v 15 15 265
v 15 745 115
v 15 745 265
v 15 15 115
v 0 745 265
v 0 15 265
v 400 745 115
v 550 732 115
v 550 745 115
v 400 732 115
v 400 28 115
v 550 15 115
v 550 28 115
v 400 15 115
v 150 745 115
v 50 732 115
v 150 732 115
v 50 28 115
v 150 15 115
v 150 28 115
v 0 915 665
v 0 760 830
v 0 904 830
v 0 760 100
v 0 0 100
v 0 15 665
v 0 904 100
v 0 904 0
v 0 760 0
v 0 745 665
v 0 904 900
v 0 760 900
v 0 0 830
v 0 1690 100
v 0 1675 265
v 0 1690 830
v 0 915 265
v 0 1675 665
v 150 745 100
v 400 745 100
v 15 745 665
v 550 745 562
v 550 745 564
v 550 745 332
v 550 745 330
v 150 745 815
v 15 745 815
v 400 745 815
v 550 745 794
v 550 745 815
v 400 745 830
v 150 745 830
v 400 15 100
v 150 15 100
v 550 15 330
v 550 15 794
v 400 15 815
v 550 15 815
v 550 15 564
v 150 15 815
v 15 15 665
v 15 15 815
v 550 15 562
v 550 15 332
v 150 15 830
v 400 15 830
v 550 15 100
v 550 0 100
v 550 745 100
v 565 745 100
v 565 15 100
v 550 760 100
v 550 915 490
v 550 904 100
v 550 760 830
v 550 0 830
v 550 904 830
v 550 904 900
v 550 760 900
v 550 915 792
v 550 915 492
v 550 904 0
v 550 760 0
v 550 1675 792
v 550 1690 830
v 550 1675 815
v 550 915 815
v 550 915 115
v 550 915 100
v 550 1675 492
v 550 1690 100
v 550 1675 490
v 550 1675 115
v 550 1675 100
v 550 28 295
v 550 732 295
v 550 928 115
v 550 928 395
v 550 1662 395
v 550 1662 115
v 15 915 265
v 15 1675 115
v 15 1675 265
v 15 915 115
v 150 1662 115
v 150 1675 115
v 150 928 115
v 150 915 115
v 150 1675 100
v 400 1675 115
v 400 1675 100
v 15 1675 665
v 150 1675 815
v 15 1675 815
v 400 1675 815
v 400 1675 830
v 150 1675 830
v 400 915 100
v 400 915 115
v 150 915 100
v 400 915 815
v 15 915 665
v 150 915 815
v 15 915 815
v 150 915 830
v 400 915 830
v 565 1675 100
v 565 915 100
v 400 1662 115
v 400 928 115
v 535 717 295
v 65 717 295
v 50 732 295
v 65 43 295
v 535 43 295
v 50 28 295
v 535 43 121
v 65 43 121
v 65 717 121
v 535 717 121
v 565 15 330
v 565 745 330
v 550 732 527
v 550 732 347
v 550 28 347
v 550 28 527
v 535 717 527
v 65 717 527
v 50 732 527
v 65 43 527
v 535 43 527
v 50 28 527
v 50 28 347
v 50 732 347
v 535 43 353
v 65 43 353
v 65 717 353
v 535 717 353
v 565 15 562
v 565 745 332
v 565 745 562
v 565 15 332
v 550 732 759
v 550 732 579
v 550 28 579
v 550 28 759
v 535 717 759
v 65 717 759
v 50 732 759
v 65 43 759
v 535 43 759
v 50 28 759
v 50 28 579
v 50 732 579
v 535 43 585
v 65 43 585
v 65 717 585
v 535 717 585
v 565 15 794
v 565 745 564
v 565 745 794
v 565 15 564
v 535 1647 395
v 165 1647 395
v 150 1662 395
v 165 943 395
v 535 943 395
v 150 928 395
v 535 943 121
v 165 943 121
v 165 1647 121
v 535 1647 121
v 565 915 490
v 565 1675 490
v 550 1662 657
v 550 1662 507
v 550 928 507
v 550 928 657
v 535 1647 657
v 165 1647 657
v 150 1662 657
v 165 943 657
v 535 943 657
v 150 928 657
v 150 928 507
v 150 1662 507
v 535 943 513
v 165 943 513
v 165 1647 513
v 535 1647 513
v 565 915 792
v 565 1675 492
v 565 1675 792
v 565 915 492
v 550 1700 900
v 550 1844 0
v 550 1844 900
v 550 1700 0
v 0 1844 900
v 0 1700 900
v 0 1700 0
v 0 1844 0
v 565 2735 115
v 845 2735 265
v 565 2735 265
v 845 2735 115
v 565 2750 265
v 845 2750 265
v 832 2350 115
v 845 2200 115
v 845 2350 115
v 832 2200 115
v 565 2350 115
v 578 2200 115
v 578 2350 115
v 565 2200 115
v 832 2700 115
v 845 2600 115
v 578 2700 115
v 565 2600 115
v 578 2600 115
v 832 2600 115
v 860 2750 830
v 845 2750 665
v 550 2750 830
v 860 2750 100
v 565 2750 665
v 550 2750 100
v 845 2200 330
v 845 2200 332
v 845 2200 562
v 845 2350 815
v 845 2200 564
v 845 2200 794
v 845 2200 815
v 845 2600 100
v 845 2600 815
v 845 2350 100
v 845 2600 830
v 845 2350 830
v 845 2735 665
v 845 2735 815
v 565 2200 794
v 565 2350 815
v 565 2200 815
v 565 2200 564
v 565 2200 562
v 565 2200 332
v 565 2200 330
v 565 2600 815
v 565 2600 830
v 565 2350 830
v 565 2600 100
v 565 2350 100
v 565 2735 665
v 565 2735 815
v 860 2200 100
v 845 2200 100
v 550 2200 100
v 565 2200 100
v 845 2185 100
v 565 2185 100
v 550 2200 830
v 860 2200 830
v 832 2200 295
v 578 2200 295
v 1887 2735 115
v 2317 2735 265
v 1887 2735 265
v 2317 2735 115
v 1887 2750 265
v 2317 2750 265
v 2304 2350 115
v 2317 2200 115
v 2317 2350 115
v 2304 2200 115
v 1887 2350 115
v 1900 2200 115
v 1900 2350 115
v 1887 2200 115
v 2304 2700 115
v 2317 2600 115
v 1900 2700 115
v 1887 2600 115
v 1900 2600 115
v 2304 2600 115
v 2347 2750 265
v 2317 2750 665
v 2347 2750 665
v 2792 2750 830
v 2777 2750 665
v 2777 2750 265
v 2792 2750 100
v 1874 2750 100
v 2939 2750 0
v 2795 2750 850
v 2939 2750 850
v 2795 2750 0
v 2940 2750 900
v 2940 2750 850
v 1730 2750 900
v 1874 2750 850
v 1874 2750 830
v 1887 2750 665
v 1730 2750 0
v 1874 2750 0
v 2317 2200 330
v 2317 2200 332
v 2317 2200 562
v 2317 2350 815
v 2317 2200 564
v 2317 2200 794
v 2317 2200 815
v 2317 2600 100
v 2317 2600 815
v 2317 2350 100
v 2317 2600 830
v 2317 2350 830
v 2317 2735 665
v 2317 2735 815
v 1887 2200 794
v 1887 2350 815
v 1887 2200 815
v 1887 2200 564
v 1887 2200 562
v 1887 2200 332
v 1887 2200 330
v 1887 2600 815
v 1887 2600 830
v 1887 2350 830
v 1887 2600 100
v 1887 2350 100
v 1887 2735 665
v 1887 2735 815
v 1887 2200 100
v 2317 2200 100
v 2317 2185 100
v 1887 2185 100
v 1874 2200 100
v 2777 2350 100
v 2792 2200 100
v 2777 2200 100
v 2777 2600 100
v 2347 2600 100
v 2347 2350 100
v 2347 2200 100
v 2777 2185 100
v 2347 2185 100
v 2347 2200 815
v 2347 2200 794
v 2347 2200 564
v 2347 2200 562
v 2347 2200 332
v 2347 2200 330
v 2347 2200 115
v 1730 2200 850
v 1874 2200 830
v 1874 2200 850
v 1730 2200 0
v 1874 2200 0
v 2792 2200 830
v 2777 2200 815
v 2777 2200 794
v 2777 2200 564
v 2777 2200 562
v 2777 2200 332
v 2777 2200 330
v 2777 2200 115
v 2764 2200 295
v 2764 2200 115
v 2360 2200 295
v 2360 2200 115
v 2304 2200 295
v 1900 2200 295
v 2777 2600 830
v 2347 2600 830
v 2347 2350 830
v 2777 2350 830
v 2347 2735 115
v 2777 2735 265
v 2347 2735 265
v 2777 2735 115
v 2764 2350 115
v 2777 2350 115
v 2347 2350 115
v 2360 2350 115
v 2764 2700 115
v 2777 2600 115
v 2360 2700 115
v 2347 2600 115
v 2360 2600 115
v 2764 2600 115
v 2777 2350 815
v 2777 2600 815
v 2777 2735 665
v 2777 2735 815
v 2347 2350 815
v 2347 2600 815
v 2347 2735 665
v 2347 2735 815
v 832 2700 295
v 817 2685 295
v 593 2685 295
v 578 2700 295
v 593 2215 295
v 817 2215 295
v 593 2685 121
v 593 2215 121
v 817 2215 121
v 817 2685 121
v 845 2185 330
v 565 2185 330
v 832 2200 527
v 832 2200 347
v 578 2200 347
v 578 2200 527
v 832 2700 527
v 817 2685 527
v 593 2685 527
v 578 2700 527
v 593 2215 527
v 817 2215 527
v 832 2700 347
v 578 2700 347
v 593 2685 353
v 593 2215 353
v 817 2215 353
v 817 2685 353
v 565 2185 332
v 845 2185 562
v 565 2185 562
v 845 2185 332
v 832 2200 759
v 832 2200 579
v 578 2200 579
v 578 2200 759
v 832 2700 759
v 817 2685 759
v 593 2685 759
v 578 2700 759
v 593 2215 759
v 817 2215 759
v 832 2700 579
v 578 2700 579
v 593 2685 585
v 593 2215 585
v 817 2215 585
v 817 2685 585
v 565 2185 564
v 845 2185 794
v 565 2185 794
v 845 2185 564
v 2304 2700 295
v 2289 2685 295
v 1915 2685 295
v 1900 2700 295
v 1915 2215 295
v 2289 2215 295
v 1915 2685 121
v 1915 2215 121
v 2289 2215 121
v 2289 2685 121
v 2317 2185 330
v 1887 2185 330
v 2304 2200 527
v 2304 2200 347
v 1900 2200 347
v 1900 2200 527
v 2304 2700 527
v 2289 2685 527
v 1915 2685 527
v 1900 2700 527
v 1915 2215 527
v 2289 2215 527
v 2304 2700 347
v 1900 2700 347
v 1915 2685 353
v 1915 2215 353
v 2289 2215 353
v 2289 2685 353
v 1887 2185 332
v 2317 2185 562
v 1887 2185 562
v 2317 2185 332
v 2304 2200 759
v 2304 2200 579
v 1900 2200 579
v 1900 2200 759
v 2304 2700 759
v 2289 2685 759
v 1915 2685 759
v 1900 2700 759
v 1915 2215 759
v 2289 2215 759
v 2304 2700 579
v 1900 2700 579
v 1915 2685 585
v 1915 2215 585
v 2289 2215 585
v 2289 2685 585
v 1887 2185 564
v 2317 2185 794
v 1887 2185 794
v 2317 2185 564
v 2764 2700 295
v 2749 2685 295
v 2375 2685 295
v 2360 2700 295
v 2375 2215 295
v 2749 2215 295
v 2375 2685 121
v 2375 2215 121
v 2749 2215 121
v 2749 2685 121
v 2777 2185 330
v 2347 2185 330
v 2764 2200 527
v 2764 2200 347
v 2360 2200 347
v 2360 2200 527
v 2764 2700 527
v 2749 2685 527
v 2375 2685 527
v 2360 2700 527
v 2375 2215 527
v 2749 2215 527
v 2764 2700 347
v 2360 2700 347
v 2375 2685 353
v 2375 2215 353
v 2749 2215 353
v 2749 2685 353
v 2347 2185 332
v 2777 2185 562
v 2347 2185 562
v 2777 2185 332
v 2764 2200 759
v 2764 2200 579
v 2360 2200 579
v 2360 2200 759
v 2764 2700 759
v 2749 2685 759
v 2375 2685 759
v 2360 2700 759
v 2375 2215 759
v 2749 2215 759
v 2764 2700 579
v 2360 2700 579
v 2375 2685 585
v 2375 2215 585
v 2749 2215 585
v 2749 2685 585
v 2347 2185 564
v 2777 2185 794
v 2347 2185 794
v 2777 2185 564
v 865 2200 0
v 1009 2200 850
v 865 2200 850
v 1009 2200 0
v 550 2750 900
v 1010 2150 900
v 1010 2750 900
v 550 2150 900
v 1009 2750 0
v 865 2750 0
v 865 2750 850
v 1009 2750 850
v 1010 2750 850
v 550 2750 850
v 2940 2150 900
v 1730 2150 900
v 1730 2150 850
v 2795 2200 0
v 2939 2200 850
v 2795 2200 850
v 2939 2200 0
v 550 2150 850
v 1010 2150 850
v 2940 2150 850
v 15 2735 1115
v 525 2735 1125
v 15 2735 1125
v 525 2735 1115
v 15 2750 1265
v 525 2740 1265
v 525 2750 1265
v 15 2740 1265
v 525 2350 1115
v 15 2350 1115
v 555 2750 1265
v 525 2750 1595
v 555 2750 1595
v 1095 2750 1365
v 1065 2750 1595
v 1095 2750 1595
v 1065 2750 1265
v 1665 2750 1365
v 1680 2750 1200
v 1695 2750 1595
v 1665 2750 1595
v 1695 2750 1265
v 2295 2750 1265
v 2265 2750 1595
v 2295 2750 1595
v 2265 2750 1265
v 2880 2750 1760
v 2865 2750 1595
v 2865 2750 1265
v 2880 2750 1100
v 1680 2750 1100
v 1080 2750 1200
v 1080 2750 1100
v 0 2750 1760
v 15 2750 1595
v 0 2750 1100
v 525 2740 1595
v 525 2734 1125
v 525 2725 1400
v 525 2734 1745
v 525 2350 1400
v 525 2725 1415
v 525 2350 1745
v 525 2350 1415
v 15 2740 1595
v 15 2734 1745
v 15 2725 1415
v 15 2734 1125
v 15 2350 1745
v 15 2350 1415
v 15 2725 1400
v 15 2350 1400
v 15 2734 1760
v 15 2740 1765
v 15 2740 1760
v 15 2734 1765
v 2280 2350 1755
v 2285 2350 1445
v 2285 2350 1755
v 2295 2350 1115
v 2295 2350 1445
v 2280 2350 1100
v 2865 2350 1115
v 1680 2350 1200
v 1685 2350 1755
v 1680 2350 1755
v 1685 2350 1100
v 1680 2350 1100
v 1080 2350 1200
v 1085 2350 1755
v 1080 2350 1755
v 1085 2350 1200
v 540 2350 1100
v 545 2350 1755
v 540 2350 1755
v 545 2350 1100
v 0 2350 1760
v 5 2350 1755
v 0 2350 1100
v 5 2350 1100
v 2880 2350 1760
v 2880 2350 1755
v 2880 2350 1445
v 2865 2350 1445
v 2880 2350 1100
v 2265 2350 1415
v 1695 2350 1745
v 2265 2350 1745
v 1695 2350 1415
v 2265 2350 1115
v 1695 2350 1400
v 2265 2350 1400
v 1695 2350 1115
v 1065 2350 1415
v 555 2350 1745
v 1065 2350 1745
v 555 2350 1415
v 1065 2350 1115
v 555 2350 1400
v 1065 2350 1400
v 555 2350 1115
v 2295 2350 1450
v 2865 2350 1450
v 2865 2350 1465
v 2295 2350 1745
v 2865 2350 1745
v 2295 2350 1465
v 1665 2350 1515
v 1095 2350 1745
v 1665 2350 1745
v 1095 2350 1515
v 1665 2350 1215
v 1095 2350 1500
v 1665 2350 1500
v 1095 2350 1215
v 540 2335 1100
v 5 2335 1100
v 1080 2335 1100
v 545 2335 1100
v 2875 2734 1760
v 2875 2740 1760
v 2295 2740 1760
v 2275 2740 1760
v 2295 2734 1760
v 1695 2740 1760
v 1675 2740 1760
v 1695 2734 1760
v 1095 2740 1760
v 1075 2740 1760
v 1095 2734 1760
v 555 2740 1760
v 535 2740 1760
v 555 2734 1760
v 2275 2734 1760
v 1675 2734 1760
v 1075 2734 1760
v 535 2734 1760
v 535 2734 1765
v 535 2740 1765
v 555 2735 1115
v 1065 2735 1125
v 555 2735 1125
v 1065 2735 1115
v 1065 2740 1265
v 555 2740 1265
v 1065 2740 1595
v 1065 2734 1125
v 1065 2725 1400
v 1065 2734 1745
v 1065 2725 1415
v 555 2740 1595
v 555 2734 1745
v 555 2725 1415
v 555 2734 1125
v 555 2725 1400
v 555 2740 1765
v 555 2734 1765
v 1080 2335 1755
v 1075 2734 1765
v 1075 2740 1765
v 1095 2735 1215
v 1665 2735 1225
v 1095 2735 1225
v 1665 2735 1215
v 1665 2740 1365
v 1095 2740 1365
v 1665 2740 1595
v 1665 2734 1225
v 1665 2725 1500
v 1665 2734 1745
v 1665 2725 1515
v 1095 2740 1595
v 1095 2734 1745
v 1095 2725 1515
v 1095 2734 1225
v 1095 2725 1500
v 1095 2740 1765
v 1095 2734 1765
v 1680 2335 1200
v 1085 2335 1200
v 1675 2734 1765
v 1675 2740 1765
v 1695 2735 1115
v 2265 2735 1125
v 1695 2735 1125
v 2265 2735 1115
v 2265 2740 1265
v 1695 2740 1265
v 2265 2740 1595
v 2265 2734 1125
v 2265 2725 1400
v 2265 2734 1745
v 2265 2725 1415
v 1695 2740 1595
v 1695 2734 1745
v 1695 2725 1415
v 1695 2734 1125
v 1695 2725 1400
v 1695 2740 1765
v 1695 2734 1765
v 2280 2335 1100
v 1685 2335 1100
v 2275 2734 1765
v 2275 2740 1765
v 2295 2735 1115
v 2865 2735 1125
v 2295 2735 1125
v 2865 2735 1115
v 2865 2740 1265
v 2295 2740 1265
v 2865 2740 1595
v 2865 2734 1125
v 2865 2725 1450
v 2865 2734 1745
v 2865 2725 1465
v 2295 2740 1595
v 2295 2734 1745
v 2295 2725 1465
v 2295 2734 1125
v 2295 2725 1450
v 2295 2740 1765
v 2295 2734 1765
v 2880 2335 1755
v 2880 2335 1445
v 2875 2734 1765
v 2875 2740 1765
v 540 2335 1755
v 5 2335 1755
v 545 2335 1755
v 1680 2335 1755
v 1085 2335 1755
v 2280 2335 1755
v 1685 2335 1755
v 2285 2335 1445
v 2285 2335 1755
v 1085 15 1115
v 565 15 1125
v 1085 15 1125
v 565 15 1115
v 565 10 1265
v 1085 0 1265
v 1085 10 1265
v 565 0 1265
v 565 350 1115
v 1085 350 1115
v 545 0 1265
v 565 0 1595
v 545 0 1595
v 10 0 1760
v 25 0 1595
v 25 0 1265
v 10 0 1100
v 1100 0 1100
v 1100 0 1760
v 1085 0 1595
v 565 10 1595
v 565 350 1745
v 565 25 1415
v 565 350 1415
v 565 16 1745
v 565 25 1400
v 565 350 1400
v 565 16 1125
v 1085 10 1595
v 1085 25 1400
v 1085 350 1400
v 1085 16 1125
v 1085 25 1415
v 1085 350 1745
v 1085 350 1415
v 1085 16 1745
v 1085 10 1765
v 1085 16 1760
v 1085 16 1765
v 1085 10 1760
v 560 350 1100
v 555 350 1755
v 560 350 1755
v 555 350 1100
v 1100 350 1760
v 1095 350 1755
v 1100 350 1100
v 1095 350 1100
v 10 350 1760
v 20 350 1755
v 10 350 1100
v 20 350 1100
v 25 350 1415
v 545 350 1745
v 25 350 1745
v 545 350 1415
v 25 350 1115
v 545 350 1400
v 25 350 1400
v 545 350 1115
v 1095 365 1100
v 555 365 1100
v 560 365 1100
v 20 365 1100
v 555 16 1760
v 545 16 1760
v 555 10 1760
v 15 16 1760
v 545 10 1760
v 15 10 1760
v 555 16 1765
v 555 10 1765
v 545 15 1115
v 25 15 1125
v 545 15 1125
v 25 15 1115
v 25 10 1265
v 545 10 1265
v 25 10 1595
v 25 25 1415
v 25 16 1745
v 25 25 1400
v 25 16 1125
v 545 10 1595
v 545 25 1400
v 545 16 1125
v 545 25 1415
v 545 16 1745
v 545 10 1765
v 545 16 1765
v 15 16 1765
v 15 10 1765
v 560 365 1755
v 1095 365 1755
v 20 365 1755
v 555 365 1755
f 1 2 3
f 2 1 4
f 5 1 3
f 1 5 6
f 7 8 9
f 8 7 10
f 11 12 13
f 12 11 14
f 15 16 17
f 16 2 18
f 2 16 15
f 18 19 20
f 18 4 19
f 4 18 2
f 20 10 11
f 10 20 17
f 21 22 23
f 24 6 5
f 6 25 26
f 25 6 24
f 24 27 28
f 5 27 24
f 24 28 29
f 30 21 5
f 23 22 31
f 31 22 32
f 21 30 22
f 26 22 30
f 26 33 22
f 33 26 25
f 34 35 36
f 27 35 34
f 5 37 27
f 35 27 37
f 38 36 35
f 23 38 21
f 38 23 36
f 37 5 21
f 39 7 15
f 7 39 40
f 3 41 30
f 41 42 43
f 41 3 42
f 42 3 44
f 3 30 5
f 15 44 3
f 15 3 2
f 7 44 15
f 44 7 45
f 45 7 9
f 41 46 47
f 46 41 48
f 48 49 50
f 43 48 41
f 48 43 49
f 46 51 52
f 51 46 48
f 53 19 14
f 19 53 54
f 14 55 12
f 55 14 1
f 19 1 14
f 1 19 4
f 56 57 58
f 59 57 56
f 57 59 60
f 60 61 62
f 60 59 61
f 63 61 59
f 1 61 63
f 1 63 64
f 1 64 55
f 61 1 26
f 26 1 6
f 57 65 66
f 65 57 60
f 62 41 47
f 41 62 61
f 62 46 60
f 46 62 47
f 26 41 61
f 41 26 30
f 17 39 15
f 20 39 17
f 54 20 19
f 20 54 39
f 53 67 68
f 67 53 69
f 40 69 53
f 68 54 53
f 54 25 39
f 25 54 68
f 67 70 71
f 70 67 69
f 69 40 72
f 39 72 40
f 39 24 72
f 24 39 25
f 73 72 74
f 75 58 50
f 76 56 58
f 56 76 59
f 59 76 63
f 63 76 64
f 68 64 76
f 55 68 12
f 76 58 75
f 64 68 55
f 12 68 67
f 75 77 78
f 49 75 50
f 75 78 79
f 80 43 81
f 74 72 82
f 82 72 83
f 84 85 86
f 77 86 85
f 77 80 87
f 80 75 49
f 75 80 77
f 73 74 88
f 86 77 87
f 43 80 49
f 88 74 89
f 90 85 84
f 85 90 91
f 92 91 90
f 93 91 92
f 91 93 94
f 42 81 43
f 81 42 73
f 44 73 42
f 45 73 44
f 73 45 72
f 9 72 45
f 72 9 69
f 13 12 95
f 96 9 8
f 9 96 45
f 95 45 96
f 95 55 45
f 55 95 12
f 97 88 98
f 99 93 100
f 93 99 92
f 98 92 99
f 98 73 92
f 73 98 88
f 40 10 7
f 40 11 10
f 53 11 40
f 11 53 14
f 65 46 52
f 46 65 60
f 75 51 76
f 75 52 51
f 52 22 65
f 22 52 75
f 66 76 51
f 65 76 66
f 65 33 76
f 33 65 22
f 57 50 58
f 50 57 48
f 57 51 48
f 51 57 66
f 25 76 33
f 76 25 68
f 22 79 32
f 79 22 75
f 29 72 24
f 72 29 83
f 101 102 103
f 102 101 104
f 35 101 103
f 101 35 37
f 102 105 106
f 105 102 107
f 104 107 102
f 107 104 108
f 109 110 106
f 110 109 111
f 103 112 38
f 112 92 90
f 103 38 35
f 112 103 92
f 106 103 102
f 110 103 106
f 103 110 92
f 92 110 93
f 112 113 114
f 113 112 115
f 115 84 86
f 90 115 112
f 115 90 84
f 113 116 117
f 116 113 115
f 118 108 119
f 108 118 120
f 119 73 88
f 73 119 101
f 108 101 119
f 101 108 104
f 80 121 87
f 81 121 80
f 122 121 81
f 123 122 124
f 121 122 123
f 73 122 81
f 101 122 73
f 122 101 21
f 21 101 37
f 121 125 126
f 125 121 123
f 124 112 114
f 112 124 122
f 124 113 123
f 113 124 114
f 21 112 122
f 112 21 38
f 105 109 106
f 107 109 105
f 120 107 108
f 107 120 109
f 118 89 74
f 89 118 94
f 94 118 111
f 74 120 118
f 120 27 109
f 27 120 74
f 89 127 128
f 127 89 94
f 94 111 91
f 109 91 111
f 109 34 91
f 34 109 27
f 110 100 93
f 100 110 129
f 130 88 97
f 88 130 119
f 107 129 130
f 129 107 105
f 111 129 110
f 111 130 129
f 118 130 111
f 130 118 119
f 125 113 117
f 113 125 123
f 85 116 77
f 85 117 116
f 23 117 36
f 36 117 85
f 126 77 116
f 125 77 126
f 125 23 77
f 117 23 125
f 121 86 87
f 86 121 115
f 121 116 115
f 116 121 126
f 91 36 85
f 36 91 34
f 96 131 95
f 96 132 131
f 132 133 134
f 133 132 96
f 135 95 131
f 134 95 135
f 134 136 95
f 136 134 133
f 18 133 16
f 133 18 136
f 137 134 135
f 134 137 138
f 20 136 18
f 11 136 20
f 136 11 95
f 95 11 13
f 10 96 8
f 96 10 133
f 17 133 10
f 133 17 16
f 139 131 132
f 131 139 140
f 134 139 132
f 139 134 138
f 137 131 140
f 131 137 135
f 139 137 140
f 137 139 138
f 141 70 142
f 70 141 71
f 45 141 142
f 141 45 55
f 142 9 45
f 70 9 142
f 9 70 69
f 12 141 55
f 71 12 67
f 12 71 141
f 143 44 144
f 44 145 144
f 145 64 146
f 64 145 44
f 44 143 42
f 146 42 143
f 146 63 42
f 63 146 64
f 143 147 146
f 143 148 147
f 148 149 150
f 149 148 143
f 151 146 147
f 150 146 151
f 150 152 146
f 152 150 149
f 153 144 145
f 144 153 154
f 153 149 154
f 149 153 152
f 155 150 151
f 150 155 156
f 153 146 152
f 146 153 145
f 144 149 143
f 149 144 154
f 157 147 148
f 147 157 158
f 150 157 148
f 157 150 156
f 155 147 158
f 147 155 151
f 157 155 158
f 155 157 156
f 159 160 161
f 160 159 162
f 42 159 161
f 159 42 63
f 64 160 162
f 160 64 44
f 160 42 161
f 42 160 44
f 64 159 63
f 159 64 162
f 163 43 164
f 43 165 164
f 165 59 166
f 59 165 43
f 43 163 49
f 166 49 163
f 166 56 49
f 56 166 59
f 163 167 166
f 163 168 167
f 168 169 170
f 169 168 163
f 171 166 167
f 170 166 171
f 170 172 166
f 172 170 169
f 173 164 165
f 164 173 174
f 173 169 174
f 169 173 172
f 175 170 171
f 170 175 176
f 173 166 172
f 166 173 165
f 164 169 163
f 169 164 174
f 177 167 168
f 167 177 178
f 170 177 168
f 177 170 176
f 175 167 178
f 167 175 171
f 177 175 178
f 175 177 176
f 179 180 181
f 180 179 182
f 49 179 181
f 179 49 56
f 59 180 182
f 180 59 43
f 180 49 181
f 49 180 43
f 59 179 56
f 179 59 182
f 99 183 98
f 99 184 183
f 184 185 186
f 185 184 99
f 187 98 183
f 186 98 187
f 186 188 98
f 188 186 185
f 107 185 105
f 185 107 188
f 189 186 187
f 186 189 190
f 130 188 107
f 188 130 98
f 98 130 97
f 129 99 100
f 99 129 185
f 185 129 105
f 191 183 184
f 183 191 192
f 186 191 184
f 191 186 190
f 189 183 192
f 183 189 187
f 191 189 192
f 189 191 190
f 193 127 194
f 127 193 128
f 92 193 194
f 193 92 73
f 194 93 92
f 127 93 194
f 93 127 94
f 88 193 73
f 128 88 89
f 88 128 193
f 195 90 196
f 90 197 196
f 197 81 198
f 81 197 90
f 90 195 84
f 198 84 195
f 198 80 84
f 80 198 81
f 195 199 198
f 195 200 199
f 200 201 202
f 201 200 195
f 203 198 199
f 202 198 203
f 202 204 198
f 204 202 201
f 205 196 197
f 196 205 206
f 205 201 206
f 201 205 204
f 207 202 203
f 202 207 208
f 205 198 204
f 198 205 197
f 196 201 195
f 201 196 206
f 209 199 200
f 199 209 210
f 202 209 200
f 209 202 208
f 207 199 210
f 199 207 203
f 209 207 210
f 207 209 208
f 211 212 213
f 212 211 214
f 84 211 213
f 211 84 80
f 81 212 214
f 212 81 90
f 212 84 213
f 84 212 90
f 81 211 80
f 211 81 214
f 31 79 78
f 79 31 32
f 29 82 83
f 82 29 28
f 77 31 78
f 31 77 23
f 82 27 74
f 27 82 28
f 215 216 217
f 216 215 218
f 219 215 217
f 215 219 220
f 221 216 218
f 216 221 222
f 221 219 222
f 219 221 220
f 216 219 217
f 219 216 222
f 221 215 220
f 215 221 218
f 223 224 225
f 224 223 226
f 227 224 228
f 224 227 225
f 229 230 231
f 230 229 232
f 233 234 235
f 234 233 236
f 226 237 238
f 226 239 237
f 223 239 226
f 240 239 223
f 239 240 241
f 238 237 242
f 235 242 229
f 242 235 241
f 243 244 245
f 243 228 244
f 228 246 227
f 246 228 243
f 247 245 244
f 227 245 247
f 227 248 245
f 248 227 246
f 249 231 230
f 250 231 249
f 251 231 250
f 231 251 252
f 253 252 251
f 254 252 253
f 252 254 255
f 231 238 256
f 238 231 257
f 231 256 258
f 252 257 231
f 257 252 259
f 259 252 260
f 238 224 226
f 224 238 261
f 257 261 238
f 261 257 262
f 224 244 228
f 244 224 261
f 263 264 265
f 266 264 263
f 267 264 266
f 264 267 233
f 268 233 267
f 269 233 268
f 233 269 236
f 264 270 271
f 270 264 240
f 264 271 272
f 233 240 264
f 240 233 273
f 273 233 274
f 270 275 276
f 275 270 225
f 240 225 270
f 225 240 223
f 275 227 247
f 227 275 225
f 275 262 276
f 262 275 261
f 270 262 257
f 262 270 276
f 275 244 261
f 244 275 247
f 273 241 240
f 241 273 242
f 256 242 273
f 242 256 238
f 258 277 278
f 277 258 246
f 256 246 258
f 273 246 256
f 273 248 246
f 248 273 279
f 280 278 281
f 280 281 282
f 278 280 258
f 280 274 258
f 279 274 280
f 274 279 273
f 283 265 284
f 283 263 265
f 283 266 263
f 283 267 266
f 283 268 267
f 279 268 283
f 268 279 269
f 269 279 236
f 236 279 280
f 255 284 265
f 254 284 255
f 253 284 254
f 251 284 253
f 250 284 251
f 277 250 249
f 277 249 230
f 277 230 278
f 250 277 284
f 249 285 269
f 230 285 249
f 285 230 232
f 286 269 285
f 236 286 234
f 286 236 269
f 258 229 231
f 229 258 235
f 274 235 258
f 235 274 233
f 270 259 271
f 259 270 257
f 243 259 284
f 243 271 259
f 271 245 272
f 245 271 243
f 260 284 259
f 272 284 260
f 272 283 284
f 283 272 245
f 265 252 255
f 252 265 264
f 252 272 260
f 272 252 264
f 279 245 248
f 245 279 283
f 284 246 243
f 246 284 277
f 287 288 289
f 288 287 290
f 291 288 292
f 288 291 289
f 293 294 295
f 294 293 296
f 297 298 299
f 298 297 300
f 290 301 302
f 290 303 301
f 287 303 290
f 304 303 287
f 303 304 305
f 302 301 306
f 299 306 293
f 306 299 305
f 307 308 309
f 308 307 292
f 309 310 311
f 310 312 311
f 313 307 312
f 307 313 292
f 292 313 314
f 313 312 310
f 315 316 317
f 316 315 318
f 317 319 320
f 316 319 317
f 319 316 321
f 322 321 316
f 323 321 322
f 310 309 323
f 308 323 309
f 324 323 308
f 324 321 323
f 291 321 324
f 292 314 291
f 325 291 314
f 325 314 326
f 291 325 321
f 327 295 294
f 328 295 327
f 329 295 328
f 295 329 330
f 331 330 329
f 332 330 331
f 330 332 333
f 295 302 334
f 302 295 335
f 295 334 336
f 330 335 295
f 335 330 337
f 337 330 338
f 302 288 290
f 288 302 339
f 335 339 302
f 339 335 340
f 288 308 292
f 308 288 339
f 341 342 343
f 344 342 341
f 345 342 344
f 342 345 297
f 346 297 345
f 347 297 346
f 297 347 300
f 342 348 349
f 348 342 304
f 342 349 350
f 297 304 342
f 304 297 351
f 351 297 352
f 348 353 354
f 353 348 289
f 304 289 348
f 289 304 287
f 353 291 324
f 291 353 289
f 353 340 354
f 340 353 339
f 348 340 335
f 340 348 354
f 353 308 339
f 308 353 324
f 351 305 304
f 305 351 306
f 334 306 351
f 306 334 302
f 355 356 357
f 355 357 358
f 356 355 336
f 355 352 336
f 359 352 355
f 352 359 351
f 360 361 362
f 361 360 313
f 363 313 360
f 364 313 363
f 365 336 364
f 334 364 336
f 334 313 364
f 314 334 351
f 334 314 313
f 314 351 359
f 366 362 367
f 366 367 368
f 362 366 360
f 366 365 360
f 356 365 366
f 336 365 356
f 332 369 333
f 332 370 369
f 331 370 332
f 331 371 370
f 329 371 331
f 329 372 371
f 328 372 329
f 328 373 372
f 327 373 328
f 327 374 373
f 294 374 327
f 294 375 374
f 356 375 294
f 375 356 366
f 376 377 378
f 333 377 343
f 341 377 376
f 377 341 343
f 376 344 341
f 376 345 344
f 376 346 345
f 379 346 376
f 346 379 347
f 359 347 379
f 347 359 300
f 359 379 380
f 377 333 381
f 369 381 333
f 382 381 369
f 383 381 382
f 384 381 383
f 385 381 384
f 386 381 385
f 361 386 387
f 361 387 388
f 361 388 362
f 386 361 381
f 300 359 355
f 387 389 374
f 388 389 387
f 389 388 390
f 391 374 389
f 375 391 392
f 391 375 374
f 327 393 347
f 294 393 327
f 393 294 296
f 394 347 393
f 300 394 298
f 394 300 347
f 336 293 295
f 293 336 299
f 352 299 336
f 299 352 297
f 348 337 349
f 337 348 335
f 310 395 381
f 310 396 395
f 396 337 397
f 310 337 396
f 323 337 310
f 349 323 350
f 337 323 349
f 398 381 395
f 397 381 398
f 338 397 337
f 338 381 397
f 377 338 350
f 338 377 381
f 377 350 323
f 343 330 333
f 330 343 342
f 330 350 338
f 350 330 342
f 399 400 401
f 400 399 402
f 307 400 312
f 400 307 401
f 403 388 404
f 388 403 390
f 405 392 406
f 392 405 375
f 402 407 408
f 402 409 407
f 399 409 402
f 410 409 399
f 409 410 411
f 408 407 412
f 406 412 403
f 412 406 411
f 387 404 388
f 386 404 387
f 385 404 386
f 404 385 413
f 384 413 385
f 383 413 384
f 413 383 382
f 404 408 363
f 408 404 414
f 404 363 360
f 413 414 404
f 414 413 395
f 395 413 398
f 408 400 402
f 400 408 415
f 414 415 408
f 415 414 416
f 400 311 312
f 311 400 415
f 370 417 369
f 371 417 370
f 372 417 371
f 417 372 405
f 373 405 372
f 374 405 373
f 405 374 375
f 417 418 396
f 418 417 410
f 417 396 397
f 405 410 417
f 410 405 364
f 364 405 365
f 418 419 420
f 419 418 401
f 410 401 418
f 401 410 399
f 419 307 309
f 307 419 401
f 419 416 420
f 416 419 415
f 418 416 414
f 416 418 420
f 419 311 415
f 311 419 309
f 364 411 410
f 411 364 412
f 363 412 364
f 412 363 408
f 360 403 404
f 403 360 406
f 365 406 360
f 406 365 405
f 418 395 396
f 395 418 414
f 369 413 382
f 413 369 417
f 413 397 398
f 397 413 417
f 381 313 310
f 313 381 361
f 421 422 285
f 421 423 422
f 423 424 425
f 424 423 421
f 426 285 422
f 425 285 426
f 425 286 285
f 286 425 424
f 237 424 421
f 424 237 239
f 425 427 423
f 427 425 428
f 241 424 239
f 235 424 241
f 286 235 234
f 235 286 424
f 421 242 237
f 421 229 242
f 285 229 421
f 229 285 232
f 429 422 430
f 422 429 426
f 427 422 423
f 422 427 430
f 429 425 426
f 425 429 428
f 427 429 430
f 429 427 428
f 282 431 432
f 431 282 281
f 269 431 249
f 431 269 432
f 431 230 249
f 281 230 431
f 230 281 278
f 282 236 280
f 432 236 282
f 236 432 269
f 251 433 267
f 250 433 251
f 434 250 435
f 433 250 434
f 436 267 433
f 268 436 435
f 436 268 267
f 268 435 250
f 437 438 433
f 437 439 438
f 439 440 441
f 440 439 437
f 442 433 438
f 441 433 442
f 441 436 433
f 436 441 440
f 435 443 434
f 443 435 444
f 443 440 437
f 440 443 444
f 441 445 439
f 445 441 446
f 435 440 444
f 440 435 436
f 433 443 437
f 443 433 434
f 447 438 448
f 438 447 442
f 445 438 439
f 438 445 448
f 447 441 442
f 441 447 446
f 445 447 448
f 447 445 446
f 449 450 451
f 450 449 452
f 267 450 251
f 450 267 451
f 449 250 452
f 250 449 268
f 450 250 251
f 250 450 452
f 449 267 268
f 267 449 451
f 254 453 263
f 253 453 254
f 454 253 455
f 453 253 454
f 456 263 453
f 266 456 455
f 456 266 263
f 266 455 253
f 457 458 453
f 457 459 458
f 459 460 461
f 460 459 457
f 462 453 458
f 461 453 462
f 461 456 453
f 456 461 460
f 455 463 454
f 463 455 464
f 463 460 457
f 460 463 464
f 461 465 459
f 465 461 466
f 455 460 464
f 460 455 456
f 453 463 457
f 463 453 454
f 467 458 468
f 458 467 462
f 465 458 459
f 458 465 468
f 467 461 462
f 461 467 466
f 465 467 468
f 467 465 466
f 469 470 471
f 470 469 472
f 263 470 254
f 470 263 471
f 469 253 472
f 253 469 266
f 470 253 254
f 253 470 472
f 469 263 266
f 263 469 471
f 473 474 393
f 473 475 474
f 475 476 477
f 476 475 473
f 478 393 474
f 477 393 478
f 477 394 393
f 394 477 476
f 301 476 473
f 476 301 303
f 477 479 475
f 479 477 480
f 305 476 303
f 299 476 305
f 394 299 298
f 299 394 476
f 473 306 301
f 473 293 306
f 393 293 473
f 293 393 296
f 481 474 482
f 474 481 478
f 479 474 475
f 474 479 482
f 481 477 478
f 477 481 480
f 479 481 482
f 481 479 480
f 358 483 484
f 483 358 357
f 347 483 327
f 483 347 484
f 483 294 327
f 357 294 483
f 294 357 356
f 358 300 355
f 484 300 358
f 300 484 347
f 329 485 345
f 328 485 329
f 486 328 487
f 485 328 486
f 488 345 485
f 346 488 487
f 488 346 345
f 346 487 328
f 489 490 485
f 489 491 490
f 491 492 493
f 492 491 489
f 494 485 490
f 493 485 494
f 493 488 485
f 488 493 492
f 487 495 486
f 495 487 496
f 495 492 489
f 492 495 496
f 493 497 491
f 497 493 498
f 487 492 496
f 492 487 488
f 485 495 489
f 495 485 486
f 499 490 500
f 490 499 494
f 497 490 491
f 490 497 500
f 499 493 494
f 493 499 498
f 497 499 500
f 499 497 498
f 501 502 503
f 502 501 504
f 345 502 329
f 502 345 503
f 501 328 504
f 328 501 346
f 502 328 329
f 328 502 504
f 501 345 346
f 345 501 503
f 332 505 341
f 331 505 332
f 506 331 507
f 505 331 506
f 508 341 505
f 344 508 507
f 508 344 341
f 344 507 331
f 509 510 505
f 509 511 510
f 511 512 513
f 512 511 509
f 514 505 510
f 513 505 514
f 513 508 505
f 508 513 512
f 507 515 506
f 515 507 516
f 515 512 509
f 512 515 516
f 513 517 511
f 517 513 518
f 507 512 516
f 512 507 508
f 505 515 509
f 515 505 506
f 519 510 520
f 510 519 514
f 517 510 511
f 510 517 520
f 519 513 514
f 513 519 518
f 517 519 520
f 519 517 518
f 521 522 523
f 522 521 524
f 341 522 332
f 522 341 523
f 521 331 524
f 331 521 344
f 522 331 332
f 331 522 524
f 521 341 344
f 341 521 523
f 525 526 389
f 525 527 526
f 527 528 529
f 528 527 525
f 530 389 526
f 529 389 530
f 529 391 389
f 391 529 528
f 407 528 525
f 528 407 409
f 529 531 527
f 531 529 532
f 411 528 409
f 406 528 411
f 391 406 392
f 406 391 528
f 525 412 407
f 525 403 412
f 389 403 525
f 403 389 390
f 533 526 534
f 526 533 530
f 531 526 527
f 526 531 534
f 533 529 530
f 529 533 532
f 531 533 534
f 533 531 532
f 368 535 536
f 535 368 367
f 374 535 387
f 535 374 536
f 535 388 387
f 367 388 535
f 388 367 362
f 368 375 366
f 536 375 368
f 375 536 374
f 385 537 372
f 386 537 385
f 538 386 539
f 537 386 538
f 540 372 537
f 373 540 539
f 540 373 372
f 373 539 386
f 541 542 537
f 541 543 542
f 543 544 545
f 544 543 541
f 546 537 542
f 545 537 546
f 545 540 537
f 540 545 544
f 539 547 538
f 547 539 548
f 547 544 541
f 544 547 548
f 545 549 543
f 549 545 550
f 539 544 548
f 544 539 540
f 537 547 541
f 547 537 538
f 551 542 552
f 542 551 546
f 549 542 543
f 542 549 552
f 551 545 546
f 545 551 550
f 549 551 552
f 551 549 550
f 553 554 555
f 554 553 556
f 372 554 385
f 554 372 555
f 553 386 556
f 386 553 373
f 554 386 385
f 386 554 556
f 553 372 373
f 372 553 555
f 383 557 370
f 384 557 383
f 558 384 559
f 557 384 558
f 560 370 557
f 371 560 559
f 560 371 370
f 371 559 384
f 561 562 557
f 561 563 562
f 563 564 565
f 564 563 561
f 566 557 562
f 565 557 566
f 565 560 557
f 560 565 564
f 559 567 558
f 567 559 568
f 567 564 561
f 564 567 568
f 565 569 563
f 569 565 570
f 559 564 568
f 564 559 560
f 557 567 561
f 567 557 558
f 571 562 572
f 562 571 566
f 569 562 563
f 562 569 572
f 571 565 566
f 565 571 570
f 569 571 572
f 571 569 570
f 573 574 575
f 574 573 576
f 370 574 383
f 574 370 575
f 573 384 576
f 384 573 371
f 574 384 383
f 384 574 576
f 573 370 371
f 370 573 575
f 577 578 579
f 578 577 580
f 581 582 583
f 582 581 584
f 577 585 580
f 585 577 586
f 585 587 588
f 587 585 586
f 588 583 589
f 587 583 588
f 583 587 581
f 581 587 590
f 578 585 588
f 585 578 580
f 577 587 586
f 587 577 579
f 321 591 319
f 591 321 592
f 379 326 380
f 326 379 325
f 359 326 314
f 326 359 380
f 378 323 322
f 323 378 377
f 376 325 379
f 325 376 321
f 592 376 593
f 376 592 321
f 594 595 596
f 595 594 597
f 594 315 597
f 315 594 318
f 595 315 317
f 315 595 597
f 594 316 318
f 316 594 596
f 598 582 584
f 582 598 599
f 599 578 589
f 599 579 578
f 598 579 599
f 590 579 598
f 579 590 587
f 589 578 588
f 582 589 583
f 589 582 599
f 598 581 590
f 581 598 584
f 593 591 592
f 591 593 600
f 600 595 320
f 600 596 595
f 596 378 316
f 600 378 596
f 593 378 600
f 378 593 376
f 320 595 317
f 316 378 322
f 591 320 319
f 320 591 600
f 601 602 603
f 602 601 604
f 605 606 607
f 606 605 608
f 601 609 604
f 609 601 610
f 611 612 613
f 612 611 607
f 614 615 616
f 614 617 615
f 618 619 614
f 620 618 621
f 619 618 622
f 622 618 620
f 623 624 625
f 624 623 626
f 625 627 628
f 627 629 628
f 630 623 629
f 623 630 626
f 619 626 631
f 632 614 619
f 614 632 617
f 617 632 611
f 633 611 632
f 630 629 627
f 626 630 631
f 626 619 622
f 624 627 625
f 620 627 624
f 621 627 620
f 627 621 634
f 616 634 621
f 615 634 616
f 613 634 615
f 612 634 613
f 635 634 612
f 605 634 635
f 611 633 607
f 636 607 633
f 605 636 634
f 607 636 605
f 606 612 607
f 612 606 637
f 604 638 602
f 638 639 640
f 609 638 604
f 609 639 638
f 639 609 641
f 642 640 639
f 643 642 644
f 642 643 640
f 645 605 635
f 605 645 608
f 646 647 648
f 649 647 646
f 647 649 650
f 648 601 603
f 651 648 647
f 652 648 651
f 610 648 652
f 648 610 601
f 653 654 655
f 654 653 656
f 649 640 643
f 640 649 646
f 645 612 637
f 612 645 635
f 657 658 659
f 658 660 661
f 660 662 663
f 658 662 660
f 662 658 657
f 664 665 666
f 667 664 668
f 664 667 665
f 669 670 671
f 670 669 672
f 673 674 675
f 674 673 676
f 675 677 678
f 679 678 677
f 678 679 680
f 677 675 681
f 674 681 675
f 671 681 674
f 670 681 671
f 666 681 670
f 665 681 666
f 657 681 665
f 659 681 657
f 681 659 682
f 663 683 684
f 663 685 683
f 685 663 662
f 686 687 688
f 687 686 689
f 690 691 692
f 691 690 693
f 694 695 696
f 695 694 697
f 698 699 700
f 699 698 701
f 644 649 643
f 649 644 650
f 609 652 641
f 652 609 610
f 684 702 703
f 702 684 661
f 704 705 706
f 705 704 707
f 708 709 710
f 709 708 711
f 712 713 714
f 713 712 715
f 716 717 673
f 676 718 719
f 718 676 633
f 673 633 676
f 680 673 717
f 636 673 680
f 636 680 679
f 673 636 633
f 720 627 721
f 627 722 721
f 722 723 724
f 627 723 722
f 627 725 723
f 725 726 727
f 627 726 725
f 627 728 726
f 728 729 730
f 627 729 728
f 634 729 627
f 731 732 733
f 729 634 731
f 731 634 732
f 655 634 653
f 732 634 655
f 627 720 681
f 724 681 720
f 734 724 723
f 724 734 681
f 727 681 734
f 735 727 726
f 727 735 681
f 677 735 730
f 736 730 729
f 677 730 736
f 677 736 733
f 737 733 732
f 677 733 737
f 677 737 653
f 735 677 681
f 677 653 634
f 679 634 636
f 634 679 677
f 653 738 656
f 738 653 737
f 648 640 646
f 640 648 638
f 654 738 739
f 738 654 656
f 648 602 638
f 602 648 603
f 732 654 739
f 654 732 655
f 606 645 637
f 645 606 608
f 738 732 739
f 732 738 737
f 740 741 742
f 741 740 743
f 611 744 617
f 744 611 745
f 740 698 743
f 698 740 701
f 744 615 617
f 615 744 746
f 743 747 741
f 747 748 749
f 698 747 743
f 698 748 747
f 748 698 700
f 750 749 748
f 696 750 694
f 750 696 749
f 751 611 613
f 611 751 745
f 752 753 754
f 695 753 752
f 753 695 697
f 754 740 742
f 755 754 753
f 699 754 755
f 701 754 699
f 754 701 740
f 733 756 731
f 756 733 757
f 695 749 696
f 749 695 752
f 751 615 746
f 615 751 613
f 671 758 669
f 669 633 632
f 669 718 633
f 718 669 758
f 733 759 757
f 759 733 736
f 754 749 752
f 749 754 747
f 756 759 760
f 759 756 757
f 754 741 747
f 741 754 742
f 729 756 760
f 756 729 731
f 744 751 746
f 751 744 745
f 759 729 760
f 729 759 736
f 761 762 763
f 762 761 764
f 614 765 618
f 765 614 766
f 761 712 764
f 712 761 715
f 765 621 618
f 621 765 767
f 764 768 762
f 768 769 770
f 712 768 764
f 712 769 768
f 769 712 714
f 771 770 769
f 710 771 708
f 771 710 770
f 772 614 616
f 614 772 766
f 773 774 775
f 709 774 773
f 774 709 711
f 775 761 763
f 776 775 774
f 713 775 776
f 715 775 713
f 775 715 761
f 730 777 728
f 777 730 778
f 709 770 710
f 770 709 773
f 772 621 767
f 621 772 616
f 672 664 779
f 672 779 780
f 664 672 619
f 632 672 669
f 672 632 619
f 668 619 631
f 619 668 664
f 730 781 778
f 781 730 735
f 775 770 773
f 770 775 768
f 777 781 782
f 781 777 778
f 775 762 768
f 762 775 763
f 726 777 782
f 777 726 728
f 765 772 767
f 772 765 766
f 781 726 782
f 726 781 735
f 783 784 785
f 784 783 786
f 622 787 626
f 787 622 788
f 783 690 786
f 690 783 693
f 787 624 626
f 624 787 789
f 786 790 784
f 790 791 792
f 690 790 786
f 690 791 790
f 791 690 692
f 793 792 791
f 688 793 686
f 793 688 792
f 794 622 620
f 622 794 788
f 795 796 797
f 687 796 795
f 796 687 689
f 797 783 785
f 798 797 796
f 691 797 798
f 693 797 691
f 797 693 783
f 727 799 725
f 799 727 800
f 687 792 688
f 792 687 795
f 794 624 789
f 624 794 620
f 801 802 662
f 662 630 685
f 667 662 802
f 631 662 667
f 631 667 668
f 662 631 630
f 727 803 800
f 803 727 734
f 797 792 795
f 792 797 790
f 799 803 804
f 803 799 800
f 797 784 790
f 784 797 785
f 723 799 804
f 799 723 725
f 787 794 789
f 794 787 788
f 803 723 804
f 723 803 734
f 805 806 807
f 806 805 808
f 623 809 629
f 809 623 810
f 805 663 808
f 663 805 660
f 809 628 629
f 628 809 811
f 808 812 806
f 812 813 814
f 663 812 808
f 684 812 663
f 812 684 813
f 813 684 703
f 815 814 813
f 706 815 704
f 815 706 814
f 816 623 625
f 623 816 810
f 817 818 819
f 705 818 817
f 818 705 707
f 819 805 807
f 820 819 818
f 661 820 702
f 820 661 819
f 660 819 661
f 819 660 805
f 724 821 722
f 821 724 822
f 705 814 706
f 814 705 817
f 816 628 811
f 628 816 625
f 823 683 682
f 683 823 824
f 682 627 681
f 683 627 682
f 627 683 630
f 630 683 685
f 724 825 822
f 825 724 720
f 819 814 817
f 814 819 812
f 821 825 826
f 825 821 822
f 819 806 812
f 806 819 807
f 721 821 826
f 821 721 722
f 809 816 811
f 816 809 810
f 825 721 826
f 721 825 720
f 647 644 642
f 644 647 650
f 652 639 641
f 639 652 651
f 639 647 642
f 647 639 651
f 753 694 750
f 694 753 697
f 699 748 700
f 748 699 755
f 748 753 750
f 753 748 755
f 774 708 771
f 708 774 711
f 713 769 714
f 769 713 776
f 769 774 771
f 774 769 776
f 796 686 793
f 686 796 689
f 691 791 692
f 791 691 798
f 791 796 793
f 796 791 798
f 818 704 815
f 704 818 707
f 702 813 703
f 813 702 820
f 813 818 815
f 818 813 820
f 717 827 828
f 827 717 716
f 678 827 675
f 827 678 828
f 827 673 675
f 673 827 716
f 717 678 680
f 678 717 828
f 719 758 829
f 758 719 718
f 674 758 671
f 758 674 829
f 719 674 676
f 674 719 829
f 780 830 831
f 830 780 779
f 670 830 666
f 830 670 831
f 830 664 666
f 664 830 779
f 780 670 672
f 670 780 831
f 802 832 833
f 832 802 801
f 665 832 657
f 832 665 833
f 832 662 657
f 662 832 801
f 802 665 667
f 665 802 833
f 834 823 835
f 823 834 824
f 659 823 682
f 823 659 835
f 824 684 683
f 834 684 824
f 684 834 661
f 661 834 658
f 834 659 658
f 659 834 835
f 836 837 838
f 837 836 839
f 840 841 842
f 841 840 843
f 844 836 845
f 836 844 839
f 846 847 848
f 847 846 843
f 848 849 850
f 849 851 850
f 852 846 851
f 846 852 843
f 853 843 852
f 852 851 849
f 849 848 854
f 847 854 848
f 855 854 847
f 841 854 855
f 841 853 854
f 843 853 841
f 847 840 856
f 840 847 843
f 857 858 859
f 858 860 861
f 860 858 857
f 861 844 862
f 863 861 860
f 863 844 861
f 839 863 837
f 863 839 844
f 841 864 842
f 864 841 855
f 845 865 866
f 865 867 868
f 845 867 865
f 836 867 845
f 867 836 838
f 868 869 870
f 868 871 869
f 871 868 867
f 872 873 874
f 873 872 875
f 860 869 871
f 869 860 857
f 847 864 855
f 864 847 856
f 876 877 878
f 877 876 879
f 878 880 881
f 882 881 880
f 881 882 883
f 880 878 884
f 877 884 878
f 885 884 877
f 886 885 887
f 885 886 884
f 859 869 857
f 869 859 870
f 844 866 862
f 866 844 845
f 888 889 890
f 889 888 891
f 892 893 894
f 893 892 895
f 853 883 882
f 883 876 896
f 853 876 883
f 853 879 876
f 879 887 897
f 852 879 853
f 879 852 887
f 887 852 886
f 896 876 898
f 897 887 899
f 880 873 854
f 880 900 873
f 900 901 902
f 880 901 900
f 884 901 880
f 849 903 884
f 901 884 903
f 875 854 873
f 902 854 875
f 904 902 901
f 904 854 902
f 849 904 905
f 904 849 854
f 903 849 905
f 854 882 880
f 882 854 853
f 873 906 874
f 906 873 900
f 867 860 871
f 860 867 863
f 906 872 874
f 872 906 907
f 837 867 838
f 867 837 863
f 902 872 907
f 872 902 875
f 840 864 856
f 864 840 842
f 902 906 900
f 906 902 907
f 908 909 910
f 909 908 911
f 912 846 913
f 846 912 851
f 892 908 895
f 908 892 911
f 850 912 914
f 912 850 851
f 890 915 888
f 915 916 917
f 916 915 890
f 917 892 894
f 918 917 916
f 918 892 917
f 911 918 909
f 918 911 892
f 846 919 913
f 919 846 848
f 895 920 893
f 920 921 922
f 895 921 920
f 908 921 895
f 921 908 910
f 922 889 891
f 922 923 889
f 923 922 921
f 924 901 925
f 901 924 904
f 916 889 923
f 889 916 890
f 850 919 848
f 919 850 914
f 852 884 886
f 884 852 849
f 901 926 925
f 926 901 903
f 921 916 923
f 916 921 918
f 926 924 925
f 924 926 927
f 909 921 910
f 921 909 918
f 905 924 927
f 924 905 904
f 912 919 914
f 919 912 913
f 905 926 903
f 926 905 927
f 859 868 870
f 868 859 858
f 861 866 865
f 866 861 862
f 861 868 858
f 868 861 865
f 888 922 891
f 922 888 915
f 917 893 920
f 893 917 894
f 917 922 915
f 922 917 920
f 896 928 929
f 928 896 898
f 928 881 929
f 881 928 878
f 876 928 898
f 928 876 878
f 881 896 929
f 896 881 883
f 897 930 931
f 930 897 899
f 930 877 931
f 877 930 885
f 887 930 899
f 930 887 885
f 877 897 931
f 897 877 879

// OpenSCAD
use <cajoneriaLibV1.scad>

module paredes(){
    translate ([-100,0,0]) color("lightslategray")
    tableroX(ancho=4100,
            alto=2900,
            espesor=100,
            posicion="fondo",
            color="red",
            parte="Pared");
    translate ([0,4100,0]) color("lightslategray")
    tableroX(ancho=1000,
            alto=2900,
            espesor=100,
            posicion="lateral",
            color="red",
            parte="Pared");
//    translate ([1000,4100-180,0]) color("lightslategray")
//    tableroX(ancho=320,
//            alto=2900,
//            espesor=320,
//            posicion="lateral",
//            color="red",
//            parte="Pilar");
    translate ([0,-100,0]) color("white")
    tableroX(ancho=2300,
            alto=2900,
            espesor=100,
            posicion="lateral",
            color="red",
            parte="Pared");
//    translate ([1000,870,0]) color("lightslategray")
//    tableroX(ancho=380,
//            alto=2900,
//            espesor=280,
//            posicion="lateral",
//            color="red",
//            parte="Pilar");
//    translate ([0,3250-400,0]) color("gainsboro")
//    tableroX(ancho=800,
//            alto=1880,
//            espesor=700,
//            posicion="fondo",
//            color="green",
//            parte="Frizer");                
}

//paredes();
module muromeson(){
    tableroX(ancho=550,
            alto=900,
            espesor=144,
            posicion="lateral",
            color="red",
            parte="Pared");
    }
module encimerameson(ancho){
    tableroX(ancho=ancho,
            alto=600,
            espesor=50,
            posicion="techo",
            color="red",
            parte="Pared");
    }

espesor = 15; riel = 13;
socalo = 100;
espacioFrizer = 900;
// modulo(i) = [
//    ancho, alto, profundidad,
//    refuerzo, esqueleto, fondo, espesor,
//    color, [x,y+sum(modulo(i..i-1)[ancho]),z], nombre
//]

mod_00 = [760,730,550,"No","Si","No",espesor,"ghostwhite",
         [0,0,socalo], "Modulo 00"];
mod_01 = [790,730,550,"No","Si","No",espesor,"ghostwhite",
         [0,mod_00[0]+140,socalo], "Modulo 01"];


mod_02 = [310,730,550,"No","Si","No",espesor,"ghostwhite",
         [0,0,socalo], "Modulo 02"];
mod_03 = [460,730,550,"No","Si","No",espesor,"ghostwhite",
         [0,mod_02[0]+312+700,socalo], "Modulo 03"];
mod_04 = [460,730,550,"No","Si","No",espesor,"ghostwhite",
         [0,mod_02[0]+mod_03[0]+312+700,socalo], "Modulo 04"];

/////Modulos Altos
altura_mod = 1100;

mod_05 = [540,660,400,"No","No","Si",espesor,"ghostwhite",
         [0,0,altura_mod], "Modulo 00"];
mod_06 = [540,660,400,"No","No","Si",espesor,"ghostwhite",
         [0,mod_05[0],altura_mod], "Modulo 01"];
mod_07 = [600,560,400,"No","No","Si",espesor,"ghostwhite",
         [0,mod_05[0]+mod_06[0],altura_mod+100], "Modulo 00"];
mod_08 = [600,660,400,"No","No","Si",espesor,"ghostwhite",
         [0,mod_05[0]+mod_06[0]+mod_07[0],altura_mod], "Modulo 01"];

mod_09 = [600,660,400,"No","No","Si",espesor,"ghostwhite",
         [0,mod_05[0]+mod_06[0]+mod_07[0]+mod_08[0],altura_mod], "Modulo 01"];


mod_10 = [550,660,350,"No","No","Si",espesor,"ghostwhite",
         [0,0,altura_mod], "Modulo 00"];
mod_11 = [550,660,350,"No","No","Si",espesor,"ghostwhite",
         [0,mod_05[0],altura_mod], "Modulo 01"];
mod_12 = [600,660,350,"No","No","Si",espesor,"ghostwhite",
         [0,mod_05[0]+mod_06[0],altura_mod], "Modulo 00"];



ModulosLavaPlatos = [mod_00, mod_01];
ModulosCocina = [mod_02, mod_03, mod_04];
ModulosAltos = [mod_05, mod_06, mod_07,
                mod_08, mod_09 
];
ModulosAltos2= [mod_10, mod_11, //mod_12,
];


esp_riel = espesor*2+riel*2;
// cajon_00 = [moduloIndex, ancho, alto, profundidad,
//          espesor, color, frenteDec, anchoDec, altoDec, 
//          colorDec, [x,y,z]]

cajon_00 = [0, mod_00[0]-esp_riel, 180, mod_00[2]-50,
          espesor, "red", "Si", mod_00[0]-espesor*2, 
          230,"green", 
          [mod_00[8][0]+50,
            mod_00[8][1]+espesor+riel,
            mod_00[8][2]+espesor]];
            
cajon_01 = [0, mod_00[0]-esp_riel, 180, mod_00[2]-50,
          espesor, "red", "Si", mod_00[0]-espesor*2, 
          230,"green", 
          [mod_00[8][0]+50,
            mod_00[8][1]+espesor+riel,
            mod_00[8][2]+espesor+230+2]];

cajon_02 = [0, mod_00[0]-esp_riel, 180, mod_00[2]-50,
          espesor, "red", "Si", mod_00[0]-espesor*2, 
          230,"green", 
          [mod_00[8][0]+50,
            mod_00[8][1]+espesor+riel,
            mod_00[8][2]+espesor+230*2+2*2]];

cajon_03 = [1, mod_01[0]-esp_riel, 280, mod_01[2]-150,
          espesor, "red", "Si", mod_01[0]-espesor*2, 
          390,"green", 
          [mod_01[8][0]+150,
            mod_01[8][1]+espesor+riel,
            mod_01[8][2]+espesor]];
            
cajon_04 = [1, mod_01[0]-esp_riel, 150, mod_01[2]-150,
          espesor, "red", "Si", mod_01[0]-espesor*2, 
          300,"green", 
          [mod_01[8][0]+150,
            mod_01[8][1]+espesor+riel,
            mod_01[8][2]+espesor+390+2]];
//////////////////////////////

cajon_05 = [2, mod_02[0]-esp_riel, 180, mod_02[2]-50,
          espesor, "red", "Si", mod_02[0]-espesor*2, 
          230,"green", 
          [mod_02[8][0]+50,
            mod_02[8][1]+espesor+riel,
            mod_02[8][2]+espesor]];
            
cajon_06 = [2, mod_02[0]-esp_riel, 180, mod_02[2]-50,
          espesor, "red", "Si", mod_02[0]-espesor*2, 
          230,"green", 
          [mod_02[8][0]+50,
            mod_02[8][1]+espesor+riel,
            mod_02[8][2]+espesor+230+2]];

cajon_07 = [2, mod_02[0]-esp_riel, 180, mod_02[2]-50,
          espesor, "red", "Si", mod_02[0]-espesor*2, 
          230,"green", 
          [mod_02[8][0]+50,
            mod_02[8][1]+espesor+riel,
            mod_02[8][2]+espesor+230*2+2*2]];

cajon_08 = [3, mod_03[0]-esp_riel, 180, mod_03[2]-50,
          espesor, "red", "Si", mod_03[0]-espesor*2, 
          230,"green", 
          [mod_03[8][0]+50,
            mod_03[8][1]+espesor+riel,
            mod_03[8][2]+espesor]];
            
cajon_09 = [3, mod_03[0]-esp_riel, 180, mod_03[2]-50,
          espesor, "red", "Si", mod_03[0]-espesor*2, 
          230,"green", 
          [mod_03[8][0]+50,
            mod_03[8][1]+espesor+riel,
            mod_03[8][2]+espesor+230+2]];

cajon_10 = [3, mod_03[0]-esp_riel, 180, mod_03[2]-50,
          espesor, "red", "Si", mod_03[0]-espesor*2, 
          230,"green", 
          [mod_03[8][0]+50,
            mod_03[8][1]+espesor+riel,
            mod_03[8][2]+espesor+230*2+2*2]];

cajon_11 = [4, mod_04[0]-esp_riel, 180, mod_04[2]-50,
          espesor, "red", "Si", mod_04[0]-espesor*2, 
          230,"green", 
          [mod_04[8][0]+50,
            mod_04[8][1]+espesor+riel,
            mod_04[8][2]+espesor]];
            
cajon_12 = [4, mod_04[0]-esp_riel, 180, mod_04[2]-50,
          espesor, "red", "Si", mod_04[0]-espesor*2, 
          230,"green", 
          [mod_04[8][0]+50,
            mod_04[8][1]+espesor+riel,
            mod_04[8][2]+espesor+230+2]];

cajon_13 = [4, mod_04[0]-esp_riel, 180, mod_04[2]-50,
          espesor, "red", "Si", mod_04[0]-espesor*2, 
          230,"green", 
          [mod_04[8][0]+50,
            mod_04[8][1]+espesor+riel,
            mod_04[8][2]+espesor+230*2+2*2]];


CajonesModLavaPlatos = [
    cajon_00, cajon_01, cajon_02,
    cajon_03, cajon_04
];
CajonesModCocina = [
   cajon_05, cajon_06, cajon_07, 
   cajon_08, cajon_09, cajon_10, 
   cajon_11, cajon_12, cajon_13, 
];

// puerta = [moduloIndex, ancho, alto, cant, espesor, 
//    color, [x,y,z]], nombre
//]

puerta_00 = [5,mod_05[0]-5,mod_05[1]-5,1,espesor,"green",
            [mod_05[8][0]+mod_05[2],
                mod_05[8][1]+5,
                mod_05[8][2]], 
            "puerta 1"];
puerta_01 = [6,mod_06[0]-5,mod_06[1]-5,1,espesor,"green",
            [mod_06[8][0]+mod_06[2],
                mod_06[8][1]+5,
                mod_06[8][2]], 
            "puerta 2"];
puerta_02 = [7,mod_07[0]-5,mod_07[1]-5,1,espesor,"green",
            [mod_07[8][0]+mod_07[2],
                mod_07[8][1]+5,
                mod_07[8][2]], 
            "puerta 2"];
puerta_03 = [8,mod_08[0]-5,mod_08[1]-5,1,espesor,"green",
            [mod_08[8][0]+mod_08[2],
                mod_08[8][1]+5,
                mod_08[8][2]], 
            "puerta 2"];
puerta_04 = [9,mod_09[0]-5,mod_09[1]-350,1,espesor,"green",
            [mod_09[8][0]+mod_09[2],
                mod_09[8][1]+5,
                mod_09[8][2]+350-5], 
            "puerta 2"];

///
puerta_05 = [10,mod_10[0]-15,mod_10[1]-5,1,espesor,"green",
            [mod_10[8][0]+mod_10[2],
                mod_10[8][1]+5,
                mod_10[8][2]], 
            "puerta 1"];
puerta_06 = [11,mod_11[0]-15,mod_11[1]-5,1,espesor,"green",
            [mod_11[8][0]+mod_11[2],
                mod_11[8][1]+5,
                mod_11[8][2]], 
            "puerta 2"];
puerta_07 = [12,mod_12[0]-15,mod_12[1]-5,1,espesor,"green",
            [mod_12[8][0]+mod_12[2],
                mod_12[8][1]+5,
                mod_12[8][2]], 
            "puerta 2"];


PuertasModAlto = [puerta_00, puerta_01,
                puerta_02, puerta_03,
                puerta_04, 
            ];

PuertasModAlto2 = [puerta_05, puerta_06,
                //puerta_07 
            ];


div_00 = [0,mod_05[0]-espesor*2,mod_05[2]-espesor-7,1,espesor,"green",
            [mod_05[8][0]+espesor+10,
                mod_05[8][1]+espesor,
                mod_05[8][2]+300], 
            "division 1"];
div_01 = [1,mod_06[0]-espesor*2,mod_06[2]-espesor-7,1,espesor,"green",
            [mod_06[8][0]+espesor+10,
                mod_06[8][1]+espesor,
                mod_06[8][2]+300], 
            "division 2"];
div_02 = [0,mod_07[0]-espesor*2,mod_07[2]-espesor-7,1,espesor,"green",
            [mod_07[8][0]+espesor+10,
                mod_07[8][1]+espesor,
                mod_07[8][2]+300], 
            "division 3"];
div_03 = [1,mod_08[0]-espesor*2,mod_08[2]-espesor-7,1,espesor,"green",
            [mod_08[8][0]+espesor+10,
                mod_08[8][1]+espesor,
                mod_08[8][2]+300], 
            "division 4"];
div_04 = [0,mod_09[0]-espesor*2,mod_09[2]-espesor-7,1,espesor,"green",
            [mod_09[8][0]+espesor+10,
                mod_09[8][1]+espesor,
                mod_09[8][2]+350], 
            "division 5"];
div_05 = [0,mod_10[0]-espesor*2,mod_10[2]-espesor-7,1,espesor,"green",
            [mod_10[8][0]+espesor+10,
                mod_10[8][1]+espesor,
                mod_10[8][2]+300], 
            "division 1"];
div_06 = [1,mod_11[0]-espesor*2,mod_11[2]-espesor-7,1,espesor,"green",
            [mod_11[8][0]+espesor+10,
                mod_11[8][1]+espesor,
                mod_11[8][2]+300], 
            "division 2"];
div_07 = [0,mod_12[0]-espesor*2,mod_12[2]-espesor-7,1,espesor,"green",
            [mod_12[8][0]+espesor+10,
                mod_12[8][1]+espesor,
                mod_12[8][2]+300], 
            "division 3"];


Divisiones = [
            div_00, div_01, div_02,         div_03, div_04
];
Divisiones2 = [
            div_05, div_06, //div_07,
];

translate([0,0,0])
union(){
    translate([0,760,0])
    muromeson();
    translate([0,1700,0])
    muromeson();
    //translate([0,0,850])
    //encimerameson(2750);
    modulosdeCocina(ModulosLavaPlatos);
//    puertasdeModulo(PuertasX,cortes);
//    armariodeModulo(armario_00);
    cajonesdeModulo(CajonesModLavaPlatos);
}           
translate([550,2750,0]) rotate([0,0,270]) 
union(){
    translate([0,315,0])
    muromeson();
    translate([0,1180,0])
    muromeson();
    translate([0,2245,0])
    muromeson();
    translate([0,0,850])
    encimerameson(460);
    translate([0,1180,850])
    encimerameson(1210);
    modulosdeCocina(ModulosCocina);
//    puertasdeModulo(PuertasX,cortes);
//    armariodeModulo(armario_00);
    cajonesdeModulo(CajonesModCocina);
}           

translate([0,2750,0]) rotate([0,0,270]) 
union(){
    modulosdeCocina(ModulosAltos);
    divHorizontal(Divisiones); 
    puertasdeModulo(PuertasModAlto);
//    armariodeModulo(armario_00);
    
}           

translate([1100,0,0]) rotate([0,0,90]) 
union(){
    modulosdeCocina(ModulosAltos2);
    divHorizontal(Divisiones2); 
    puertasdeModulo(PuertasModAlto2);
//    armariodeModulo(armario_00);
    
}           
